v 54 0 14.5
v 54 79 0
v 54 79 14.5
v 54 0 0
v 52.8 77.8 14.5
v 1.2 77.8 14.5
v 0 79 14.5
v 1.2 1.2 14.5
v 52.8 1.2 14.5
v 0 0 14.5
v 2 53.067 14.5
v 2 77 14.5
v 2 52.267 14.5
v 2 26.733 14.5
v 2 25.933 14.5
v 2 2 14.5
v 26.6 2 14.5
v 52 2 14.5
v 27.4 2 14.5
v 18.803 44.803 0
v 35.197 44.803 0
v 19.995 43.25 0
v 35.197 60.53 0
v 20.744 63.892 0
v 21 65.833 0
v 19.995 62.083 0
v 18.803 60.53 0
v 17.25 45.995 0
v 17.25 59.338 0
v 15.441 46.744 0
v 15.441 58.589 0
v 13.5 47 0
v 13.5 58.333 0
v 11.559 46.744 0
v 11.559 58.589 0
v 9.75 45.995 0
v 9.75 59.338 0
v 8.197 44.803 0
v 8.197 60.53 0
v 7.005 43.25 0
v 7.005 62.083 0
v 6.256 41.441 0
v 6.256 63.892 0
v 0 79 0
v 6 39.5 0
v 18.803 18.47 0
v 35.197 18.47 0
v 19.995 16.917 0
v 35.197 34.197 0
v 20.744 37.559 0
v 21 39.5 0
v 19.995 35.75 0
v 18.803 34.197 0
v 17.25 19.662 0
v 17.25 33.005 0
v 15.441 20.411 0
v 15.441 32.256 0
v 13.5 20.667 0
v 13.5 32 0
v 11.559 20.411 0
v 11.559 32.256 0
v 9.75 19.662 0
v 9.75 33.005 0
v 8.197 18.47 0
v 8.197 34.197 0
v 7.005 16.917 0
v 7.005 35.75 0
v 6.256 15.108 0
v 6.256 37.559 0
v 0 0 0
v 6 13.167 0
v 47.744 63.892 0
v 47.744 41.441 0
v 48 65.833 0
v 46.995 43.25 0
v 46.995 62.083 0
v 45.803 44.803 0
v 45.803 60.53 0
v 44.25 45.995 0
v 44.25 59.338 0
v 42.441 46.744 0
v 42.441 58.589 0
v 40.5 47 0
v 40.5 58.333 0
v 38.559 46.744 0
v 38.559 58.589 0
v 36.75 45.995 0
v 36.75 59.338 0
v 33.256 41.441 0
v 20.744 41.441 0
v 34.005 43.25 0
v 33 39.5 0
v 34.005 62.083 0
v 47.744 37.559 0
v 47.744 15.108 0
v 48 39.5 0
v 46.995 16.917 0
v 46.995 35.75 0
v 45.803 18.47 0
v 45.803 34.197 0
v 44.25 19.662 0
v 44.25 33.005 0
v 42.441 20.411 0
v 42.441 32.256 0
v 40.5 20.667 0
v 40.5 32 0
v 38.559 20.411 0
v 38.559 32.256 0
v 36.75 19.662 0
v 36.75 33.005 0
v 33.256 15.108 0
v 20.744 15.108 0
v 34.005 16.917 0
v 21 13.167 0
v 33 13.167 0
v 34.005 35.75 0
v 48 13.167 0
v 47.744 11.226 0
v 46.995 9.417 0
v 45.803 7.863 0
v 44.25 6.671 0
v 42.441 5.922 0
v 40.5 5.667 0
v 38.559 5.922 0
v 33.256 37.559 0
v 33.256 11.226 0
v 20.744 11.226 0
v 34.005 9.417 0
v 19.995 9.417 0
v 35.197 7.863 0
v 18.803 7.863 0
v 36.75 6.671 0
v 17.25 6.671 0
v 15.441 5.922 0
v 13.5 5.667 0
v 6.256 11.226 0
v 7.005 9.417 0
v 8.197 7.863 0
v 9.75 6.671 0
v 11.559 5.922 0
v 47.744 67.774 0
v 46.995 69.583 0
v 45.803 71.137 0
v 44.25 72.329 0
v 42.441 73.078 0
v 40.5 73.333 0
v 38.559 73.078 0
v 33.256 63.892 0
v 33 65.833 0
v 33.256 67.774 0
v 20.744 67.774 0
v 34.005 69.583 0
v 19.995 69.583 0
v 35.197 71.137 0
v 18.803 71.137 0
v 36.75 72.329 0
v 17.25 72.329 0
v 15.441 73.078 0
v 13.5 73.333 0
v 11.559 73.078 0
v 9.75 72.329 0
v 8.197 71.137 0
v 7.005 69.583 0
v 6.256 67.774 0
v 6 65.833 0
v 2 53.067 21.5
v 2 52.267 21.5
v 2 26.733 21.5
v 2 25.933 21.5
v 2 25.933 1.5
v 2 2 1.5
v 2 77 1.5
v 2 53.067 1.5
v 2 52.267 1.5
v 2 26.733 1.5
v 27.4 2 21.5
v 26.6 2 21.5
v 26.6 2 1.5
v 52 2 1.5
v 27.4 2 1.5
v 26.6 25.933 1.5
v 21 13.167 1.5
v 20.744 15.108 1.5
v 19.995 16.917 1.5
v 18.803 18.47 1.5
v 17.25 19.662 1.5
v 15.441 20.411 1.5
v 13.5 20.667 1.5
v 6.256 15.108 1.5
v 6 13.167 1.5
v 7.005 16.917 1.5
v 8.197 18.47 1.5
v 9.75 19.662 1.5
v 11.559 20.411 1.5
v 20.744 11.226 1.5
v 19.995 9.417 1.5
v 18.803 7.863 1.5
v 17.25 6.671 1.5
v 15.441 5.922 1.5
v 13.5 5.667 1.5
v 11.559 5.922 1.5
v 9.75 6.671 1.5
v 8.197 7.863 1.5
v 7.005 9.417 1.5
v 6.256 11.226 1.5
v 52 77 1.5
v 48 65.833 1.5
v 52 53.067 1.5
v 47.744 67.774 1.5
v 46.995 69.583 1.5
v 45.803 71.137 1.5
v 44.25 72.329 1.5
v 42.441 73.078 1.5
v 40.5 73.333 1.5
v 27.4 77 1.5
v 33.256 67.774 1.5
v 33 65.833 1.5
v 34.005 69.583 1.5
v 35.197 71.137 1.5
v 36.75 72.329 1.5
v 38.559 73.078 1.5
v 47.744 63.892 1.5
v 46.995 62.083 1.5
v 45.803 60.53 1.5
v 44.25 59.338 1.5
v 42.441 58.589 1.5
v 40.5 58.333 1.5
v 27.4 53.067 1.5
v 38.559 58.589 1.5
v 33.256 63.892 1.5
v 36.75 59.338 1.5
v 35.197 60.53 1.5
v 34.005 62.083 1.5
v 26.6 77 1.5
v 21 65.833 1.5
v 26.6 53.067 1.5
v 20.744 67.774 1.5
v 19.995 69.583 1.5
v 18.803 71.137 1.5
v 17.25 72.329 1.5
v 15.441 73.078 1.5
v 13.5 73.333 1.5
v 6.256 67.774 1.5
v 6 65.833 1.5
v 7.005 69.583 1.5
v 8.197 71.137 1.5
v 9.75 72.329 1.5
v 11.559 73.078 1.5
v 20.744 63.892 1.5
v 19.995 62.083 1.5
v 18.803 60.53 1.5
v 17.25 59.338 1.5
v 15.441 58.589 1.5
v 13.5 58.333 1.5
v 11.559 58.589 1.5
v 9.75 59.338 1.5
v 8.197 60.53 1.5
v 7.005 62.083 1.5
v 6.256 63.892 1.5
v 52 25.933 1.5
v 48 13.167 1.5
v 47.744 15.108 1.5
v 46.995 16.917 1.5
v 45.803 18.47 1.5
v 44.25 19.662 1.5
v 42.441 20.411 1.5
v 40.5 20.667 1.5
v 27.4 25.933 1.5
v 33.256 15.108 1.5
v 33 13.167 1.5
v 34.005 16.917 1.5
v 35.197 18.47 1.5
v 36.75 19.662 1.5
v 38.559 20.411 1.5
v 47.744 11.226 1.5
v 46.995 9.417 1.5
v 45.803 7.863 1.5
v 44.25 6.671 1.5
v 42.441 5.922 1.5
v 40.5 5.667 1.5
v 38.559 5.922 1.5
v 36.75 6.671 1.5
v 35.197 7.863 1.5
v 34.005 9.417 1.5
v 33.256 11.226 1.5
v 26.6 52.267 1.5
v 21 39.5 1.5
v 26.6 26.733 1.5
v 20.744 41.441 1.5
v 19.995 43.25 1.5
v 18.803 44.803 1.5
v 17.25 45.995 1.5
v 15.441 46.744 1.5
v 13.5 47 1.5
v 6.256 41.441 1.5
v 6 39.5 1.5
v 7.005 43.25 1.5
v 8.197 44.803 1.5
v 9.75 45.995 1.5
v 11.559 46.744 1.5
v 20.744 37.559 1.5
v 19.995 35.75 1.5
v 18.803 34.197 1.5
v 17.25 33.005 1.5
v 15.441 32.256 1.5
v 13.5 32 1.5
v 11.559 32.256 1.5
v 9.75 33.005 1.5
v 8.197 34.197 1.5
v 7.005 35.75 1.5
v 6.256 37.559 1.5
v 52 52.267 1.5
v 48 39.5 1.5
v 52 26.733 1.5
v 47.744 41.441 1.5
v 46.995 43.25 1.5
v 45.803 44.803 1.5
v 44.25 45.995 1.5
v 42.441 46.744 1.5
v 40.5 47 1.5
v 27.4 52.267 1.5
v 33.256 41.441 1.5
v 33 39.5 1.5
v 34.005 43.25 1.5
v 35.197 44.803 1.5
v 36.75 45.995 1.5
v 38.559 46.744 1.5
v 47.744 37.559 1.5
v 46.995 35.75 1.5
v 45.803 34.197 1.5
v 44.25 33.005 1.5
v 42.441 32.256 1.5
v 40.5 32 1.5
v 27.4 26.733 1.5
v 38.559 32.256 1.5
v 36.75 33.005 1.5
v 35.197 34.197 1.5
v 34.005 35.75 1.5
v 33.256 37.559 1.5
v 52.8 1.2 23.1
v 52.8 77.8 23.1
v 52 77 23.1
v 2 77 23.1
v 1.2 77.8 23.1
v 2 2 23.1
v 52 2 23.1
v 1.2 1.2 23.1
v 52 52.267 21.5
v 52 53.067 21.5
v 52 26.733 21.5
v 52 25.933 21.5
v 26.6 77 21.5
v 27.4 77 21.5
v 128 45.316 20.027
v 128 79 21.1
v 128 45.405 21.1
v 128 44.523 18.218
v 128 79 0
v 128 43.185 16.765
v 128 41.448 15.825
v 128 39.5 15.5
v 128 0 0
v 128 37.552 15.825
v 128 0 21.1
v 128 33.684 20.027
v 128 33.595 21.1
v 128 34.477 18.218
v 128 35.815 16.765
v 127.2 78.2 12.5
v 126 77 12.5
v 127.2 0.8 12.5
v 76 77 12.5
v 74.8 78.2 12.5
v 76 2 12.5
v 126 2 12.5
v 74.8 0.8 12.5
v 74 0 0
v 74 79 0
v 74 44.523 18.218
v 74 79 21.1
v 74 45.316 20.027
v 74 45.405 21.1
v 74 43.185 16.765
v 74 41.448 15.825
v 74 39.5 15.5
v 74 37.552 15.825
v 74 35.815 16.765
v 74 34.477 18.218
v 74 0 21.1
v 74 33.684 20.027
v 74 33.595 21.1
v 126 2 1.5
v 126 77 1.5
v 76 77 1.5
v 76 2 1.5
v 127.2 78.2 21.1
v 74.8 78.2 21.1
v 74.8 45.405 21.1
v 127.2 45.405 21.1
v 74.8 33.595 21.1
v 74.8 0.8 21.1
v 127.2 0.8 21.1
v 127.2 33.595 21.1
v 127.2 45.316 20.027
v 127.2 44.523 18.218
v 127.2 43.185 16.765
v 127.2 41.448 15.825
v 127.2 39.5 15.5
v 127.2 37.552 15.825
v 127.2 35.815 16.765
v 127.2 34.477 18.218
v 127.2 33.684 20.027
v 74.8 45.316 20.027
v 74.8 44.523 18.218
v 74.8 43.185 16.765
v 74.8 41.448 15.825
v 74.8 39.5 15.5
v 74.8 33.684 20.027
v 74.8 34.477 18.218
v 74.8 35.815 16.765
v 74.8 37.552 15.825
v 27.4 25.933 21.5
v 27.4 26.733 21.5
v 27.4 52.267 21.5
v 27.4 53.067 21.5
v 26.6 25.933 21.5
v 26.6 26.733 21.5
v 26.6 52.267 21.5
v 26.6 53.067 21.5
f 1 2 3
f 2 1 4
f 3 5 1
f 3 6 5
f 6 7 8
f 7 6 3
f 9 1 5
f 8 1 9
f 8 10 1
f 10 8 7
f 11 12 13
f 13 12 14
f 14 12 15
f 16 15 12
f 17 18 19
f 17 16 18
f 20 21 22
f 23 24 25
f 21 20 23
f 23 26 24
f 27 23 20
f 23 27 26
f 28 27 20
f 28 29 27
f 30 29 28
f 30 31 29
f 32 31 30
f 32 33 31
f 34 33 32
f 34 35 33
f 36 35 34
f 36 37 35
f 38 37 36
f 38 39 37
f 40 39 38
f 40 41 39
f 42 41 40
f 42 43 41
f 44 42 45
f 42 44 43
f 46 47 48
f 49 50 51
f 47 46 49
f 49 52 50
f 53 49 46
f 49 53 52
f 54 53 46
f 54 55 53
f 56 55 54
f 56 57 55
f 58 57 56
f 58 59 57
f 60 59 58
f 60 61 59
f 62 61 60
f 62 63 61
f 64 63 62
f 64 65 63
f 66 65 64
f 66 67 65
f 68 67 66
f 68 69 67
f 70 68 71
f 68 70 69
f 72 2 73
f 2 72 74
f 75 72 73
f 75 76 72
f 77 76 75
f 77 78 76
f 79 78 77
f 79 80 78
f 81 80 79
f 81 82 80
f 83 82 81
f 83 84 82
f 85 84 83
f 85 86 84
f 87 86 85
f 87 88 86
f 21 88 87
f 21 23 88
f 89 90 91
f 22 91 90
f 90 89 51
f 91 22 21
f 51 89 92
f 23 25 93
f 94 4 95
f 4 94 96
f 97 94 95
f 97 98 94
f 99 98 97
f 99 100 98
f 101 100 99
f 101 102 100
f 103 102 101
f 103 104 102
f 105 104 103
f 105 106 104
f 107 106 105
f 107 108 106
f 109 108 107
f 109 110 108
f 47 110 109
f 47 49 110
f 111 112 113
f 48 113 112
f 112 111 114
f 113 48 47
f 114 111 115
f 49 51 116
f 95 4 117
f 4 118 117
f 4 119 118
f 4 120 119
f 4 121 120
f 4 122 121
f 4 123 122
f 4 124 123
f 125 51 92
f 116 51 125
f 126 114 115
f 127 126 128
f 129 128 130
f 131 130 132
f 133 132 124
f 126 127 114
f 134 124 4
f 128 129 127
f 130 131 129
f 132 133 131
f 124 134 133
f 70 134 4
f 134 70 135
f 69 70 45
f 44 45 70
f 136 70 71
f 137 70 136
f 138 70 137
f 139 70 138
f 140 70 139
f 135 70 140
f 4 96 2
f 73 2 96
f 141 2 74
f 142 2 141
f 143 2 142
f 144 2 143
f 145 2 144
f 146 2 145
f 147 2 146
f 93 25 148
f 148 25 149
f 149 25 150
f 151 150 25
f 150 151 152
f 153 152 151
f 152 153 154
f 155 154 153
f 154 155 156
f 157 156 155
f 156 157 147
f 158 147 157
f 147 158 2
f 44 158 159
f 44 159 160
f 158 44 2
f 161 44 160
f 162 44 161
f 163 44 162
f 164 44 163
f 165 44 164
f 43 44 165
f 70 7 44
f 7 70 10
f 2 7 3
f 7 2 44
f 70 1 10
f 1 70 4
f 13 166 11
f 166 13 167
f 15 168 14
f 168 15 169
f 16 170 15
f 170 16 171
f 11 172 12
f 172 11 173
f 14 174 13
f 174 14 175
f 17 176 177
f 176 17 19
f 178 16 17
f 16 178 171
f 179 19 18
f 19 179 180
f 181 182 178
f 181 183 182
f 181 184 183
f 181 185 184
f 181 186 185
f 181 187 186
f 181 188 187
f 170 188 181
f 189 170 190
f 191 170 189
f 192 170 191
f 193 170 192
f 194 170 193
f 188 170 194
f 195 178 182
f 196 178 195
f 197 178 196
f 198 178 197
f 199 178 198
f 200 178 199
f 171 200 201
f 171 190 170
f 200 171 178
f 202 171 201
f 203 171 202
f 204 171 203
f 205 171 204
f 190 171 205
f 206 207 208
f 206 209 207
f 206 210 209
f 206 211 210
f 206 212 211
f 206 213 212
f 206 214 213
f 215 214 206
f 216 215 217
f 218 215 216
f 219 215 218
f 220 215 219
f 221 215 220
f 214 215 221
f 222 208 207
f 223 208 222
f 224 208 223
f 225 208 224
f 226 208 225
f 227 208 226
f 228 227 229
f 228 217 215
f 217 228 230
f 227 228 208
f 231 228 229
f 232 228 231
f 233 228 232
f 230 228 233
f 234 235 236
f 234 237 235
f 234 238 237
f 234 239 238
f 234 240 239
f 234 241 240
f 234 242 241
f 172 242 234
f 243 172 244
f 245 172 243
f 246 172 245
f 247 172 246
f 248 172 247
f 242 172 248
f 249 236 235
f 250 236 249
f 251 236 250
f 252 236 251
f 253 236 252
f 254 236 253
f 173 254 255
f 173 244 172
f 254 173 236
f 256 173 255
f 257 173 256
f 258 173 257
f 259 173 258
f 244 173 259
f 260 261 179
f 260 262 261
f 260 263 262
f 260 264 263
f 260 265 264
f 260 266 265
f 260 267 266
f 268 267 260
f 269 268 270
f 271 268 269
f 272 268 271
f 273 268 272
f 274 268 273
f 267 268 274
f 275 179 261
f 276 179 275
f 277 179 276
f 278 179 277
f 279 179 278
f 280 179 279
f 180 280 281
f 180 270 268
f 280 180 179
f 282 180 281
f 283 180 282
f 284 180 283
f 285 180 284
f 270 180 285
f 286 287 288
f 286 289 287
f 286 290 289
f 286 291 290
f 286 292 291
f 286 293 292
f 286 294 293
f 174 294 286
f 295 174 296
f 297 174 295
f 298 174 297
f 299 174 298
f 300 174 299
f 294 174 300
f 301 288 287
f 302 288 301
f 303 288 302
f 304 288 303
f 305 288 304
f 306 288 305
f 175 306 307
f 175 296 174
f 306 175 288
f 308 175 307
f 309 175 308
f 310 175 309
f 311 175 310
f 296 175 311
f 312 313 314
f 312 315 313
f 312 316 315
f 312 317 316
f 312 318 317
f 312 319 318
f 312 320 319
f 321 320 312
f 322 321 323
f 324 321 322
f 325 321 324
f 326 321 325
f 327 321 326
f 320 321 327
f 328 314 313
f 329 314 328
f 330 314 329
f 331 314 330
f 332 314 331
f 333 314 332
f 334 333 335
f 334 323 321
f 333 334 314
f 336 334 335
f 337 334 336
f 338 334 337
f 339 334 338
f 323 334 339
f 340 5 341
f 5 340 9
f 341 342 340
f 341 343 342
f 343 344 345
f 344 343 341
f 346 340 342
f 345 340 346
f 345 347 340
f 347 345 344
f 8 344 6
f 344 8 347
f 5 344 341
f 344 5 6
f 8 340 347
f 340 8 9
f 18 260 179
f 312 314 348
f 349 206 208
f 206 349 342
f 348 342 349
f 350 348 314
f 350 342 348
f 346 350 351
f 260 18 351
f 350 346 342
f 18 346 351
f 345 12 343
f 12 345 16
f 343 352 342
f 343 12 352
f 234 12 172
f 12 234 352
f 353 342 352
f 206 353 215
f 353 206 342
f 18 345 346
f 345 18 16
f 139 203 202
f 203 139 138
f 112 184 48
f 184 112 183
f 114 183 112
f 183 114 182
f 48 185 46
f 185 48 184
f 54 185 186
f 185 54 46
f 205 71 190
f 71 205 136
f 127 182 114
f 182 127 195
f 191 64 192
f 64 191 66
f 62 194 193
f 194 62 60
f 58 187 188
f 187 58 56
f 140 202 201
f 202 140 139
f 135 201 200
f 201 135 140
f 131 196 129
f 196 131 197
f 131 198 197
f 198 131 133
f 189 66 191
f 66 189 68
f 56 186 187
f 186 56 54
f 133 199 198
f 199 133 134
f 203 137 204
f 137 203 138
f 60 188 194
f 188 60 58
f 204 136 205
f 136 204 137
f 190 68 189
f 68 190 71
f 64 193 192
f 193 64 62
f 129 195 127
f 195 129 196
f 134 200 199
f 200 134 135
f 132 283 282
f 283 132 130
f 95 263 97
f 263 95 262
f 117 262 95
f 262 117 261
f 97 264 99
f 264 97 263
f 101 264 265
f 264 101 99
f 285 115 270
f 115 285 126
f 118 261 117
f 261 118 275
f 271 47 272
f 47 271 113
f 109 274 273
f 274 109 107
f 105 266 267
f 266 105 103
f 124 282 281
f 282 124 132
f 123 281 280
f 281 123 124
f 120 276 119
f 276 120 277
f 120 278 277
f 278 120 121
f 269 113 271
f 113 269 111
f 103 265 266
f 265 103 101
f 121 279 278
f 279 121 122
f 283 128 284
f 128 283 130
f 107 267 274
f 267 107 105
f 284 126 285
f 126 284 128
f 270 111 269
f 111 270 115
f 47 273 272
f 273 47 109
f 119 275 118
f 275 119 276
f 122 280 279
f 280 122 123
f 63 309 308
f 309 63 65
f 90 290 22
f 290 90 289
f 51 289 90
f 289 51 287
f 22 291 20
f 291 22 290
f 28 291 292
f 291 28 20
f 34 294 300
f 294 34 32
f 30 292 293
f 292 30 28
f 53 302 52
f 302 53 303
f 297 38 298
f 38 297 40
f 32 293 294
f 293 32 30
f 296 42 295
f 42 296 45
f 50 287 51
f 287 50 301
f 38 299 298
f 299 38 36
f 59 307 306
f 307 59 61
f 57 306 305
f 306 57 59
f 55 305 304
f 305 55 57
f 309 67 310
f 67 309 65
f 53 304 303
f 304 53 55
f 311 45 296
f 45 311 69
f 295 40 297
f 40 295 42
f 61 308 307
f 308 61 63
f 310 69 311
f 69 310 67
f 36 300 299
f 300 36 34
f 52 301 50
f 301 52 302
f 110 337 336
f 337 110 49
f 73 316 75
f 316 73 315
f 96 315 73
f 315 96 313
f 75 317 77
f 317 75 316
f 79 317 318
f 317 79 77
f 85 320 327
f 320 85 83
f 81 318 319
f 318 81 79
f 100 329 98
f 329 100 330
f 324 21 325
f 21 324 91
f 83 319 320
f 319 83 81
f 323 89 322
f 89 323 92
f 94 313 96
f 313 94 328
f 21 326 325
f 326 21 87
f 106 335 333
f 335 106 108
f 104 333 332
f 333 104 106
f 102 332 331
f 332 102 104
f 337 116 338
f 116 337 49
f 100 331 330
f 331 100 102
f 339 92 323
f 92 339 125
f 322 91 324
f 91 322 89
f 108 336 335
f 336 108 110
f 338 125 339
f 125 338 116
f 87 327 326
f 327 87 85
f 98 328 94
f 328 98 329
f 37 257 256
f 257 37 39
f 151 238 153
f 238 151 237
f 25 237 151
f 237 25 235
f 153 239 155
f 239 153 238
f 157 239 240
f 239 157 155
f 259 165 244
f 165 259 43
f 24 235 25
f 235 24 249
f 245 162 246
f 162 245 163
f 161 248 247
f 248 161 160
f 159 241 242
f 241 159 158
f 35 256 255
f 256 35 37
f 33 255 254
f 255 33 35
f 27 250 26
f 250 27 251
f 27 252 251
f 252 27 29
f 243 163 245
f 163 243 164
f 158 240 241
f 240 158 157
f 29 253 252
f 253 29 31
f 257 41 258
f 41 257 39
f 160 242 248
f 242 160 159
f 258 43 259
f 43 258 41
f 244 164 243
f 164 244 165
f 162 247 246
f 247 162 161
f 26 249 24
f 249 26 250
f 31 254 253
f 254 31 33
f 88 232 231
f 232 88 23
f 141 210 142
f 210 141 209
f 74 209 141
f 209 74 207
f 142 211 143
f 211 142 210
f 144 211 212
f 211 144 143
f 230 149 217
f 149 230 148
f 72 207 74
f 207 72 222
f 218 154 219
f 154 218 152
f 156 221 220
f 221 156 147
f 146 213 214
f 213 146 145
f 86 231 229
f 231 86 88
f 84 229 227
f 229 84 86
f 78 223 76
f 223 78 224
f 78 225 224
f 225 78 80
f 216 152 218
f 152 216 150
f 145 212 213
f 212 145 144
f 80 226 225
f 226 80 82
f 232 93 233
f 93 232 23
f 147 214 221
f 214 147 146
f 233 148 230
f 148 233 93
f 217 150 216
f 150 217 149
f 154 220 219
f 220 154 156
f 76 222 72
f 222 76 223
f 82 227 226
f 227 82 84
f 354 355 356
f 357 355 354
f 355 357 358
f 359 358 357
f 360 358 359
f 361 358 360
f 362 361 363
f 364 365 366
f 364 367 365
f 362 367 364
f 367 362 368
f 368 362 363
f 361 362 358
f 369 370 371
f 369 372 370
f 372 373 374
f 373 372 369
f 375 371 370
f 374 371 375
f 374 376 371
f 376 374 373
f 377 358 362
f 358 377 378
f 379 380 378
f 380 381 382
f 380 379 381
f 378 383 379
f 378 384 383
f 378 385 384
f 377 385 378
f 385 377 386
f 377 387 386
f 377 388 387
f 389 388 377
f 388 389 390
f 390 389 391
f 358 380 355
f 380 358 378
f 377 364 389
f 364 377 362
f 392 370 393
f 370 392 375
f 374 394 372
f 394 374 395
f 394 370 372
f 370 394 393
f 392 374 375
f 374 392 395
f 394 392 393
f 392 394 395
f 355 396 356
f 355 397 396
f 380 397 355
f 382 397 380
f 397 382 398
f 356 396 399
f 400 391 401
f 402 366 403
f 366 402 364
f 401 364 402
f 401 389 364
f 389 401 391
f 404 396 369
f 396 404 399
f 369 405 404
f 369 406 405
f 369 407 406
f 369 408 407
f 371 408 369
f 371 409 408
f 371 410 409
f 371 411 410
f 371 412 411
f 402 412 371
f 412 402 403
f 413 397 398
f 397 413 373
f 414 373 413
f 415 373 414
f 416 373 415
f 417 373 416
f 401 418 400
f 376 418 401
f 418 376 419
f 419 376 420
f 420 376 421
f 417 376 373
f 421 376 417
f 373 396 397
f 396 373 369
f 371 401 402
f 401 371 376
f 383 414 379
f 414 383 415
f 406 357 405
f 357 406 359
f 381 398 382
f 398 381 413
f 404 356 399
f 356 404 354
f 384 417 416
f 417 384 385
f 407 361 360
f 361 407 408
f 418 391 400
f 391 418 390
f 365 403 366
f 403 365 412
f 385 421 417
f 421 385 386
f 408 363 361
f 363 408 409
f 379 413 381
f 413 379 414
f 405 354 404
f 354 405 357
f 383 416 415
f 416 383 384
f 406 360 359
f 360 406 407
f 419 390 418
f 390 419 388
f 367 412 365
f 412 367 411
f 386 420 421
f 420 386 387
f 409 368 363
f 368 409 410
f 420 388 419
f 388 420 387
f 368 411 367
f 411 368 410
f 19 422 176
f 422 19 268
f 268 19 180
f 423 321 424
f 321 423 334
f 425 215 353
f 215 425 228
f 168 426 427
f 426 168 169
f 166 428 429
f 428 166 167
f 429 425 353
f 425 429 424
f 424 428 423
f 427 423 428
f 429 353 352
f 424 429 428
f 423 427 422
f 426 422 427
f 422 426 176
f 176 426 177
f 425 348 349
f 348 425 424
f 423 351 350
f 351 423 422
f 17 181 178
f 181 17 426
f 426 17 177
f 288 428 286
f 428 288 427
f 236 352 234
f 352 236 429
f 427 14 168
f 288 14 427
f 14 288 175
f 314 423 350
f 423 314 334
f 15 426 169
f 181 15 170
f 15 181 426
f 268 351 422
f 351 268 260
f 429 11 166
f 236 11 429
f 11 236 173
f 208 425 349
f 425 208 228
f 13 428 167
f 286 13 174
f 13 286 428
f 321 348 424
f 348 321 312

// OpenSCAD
// file: lib_boxes6.scad
// lib_boxes6.scad

/**
x1 = width
y1 = depth
z1 = height
r1 = radius of corners
*/
module rounded_rectangle(x1, y1, z1, r1) {
    if (r1 > 0.00001) { // deal with rounding errors 
		translate([r1, r1, 0]) {
			minkowski () {
				cube([x1-2*r1, y1-2*r1, z1/2]);
				cylinder(z1/2, r1, r1);
			}
		}
	} else {
		cube([x1, y1, z1]);
	}
}

/**
x1 = width
y1 = depth
z1 = height
r1 = radius of corners
d1 = thickness
*/
module rounded_ring(x1, y1, z1, r1, d1) {
	difference () {
		rounded_rectangle(x1, y1, z1, r1);
		translate([d1, d1, 0]) {
			rounded_rectangle(x1-2*d1, y1-2*d1, z1+0.001, r1-d1);
		}
	}
}

/**
x1 = width
y1 = depth
z1 = height
r1 = radius of corners
d1 = wall thickness
d2 = bottom thickness
*/
module open_box(x1, y1, z1, r1, d1, d2) {
	rounded_rectangle(x1, y1, d2, r1);
	rounded_ring(x1, y1, z1, r1, d1);
}

/**
Bottom of a friction fit box
x1 = width
y1 = depth
z1 = height
r1 = radius of corners
d1 = wall thickness
z2 = friction
d2 = tolerance
d4 = bottom thickness
*/
module box_bottom(x1, y1, z1, r1, d1, z2, d2, d4) {
	x2 = d1/2+d2/2;
	y2 = d1/2+d2/2;
	x3 = x1-2*x2;
	y3 = y1-2*y2;
	r3 = max(r1-x2, 0);
	d3 = d1/2-d2/2;
	mm = floor(min(x1, y1)/10);

	difference() {
		union() {
			open_box(x1, y1, z1-z2, r1, d1, d4);
			translate([x2, y2, 0]) {
				rounded_ring(x3, y3, z1-d2, r3, d3, d4);
			}
		}
		*for (ii = [1 : mm]) {
			xx1 = 5*ii;
			xx2 = x1-10*ii;
			yy1 = 5*ii;
			yy2 = y1-10*ii;
			rr2 = r1-5*ii;
			translate([xx1, yy1, 0]) {
				rounded_ring(xx2, yy2, 0.65, rr2, 3);
			}
		}
	}
}

/**
Top of a friction fit box.
x1 = width
y1 = depth
z1 = height
r1 = radius of corners
d1 = wall thickness
z2 = friction
d2 = tolerance
d4 = top thickness
*/
module box_top(x1, y1, z1, r1, d1, z2, d2, d4) {
	x2 = d1/2+d2;
	y2 = d1/2+d2;
	x3 = x1-2*x2;
	y3 = y1-2*y2;
	z3 = z1+z2-d2;
	r3 = max(r1-x2, 0);
	d3 = d1/2-d2/2;
	mm = floor(min(x1, y1)/10);
	
	difference() {
		union() {
			open_box(x1, y1, z1-z2, r1, d1, d4);
			rounded_ring(x1, y1, z1-d2, r1, d3, d4);
		}

		*for (ii = [1 : mm]) {
			xx1 = 5*ii;
			xx2 = x1-10*ii;
			yy1 = 5*ii;
			yy2 = y1-10*ii;
			rr2 = r1-5*ii;
			translate([xx1, yy1, 0]) {
				rounded_ring(xx2, yy2, 0.65, rr2, 3);
			}
		}
	}
}

/**
x1 = width
y1 = depth
z1 = height
r1 = radius of corners
d1 = thickness
z2 = friction
d2 = tolerance
r2 = radius of fingers
*/
module fingers(x1, y1, z1, r1, d1, z2, d2, r2) {
	zz = max(z1, r2+d2);
    translate([0, y1/2, zz]) {
		rotate([0, 90, 0]) {
			translate([0, 0, -1]) {
				cylinder(x1+2, r2, r2);
			}
		}
	}
}

/**
x1 = width
y1 = depth
z1 = height
d1 = thickness
z2 = friction
d2 = tolerance
*/
module pimples(x1, y1, z1, d1, z2, d2) {
	translate([x1/2, (d1/2), z1-(z2/2)]) {
		sphere(d1/2);
	}
	translate([x1/2, y1-(d1/2), z1-(z2/2)]) {
		sphere(d1/2);
	}
}
// main file
// boxes5_text.scad

use <lib_boxes6.scad>

sdx = 25;
sdy = 2.2;
sdz = 33;




//$fn = 60.00;
x = sdx*2;       // inner length
y = sdx*3;       // inner depth
z = sdz;       // inner height
r = 0;        // inner corner radius
f = 9;       // friction
t = 0.4;       // tolerance
d1 = 0.8*2+t; // wall thickness
d2 = 1.5;
d3 = 1.5;

xc = x+2*d1;
yc = y+2*d1;
zb = 2*z/3+d2;
zt = f+d3+z/3;
rc = 0;//r+d1;


//x1 = inner width
//y1 = inner depth
//z1 = inner height
//d1 = thickness
//r1 = radius of inner corners
//z2 = inner height of lid
//d2 = gap
//r2 = radius of finger cutouts
//f1 = sleeve the bottom


difference() {
    box_bottom(xc, yc, zb, rc, d1, f, t, d2);
    translate([xc/4, yc/6, 0]) cylinder(h=d2, d = 15);
    translate([3*xc/4, yc/6, 0]) cylinder(h=d2, d = 15);
    translate([xc/4, 3*yc/6, 0]) cylinder(h=d2, d = 15);
    translate([3*xc/4, 3*yc/6, 0]) cylinder(h=d2, d = 15);
    translate([xc/4, 5*yc/6, 0]) cylinder(h=d2, d = 15);
    translate([3*xc/4, 5*yc/6, 0]) cylinder(h=d2, d = 15);
}
translate([xc/2-0.4, d1, 0]) cube([0.8, yc-2*d1, zt]);
translate([d1, yc/3-0.4, 0]) cube([xc-2*d1, 0.8, zt]);
translate([d1, 2*yc/3-0.4, 0]) cube([xc-2*d1, 0.8, zt]);


translate([xc+20, 0, 0]) {
	difference() {
		box_top(xc, yc, zt, rc, d1, f, t, d3);
		fingers(xc, yc, zt, rc, d1, f, t, f*2/3);
	}
}

*translate([30+d1/2, d1, 0]) {
    cube([d, y, z]);
}
*translate([d1, 30+d1/2, 0]) {
    cube([x, d1, z]);
}
